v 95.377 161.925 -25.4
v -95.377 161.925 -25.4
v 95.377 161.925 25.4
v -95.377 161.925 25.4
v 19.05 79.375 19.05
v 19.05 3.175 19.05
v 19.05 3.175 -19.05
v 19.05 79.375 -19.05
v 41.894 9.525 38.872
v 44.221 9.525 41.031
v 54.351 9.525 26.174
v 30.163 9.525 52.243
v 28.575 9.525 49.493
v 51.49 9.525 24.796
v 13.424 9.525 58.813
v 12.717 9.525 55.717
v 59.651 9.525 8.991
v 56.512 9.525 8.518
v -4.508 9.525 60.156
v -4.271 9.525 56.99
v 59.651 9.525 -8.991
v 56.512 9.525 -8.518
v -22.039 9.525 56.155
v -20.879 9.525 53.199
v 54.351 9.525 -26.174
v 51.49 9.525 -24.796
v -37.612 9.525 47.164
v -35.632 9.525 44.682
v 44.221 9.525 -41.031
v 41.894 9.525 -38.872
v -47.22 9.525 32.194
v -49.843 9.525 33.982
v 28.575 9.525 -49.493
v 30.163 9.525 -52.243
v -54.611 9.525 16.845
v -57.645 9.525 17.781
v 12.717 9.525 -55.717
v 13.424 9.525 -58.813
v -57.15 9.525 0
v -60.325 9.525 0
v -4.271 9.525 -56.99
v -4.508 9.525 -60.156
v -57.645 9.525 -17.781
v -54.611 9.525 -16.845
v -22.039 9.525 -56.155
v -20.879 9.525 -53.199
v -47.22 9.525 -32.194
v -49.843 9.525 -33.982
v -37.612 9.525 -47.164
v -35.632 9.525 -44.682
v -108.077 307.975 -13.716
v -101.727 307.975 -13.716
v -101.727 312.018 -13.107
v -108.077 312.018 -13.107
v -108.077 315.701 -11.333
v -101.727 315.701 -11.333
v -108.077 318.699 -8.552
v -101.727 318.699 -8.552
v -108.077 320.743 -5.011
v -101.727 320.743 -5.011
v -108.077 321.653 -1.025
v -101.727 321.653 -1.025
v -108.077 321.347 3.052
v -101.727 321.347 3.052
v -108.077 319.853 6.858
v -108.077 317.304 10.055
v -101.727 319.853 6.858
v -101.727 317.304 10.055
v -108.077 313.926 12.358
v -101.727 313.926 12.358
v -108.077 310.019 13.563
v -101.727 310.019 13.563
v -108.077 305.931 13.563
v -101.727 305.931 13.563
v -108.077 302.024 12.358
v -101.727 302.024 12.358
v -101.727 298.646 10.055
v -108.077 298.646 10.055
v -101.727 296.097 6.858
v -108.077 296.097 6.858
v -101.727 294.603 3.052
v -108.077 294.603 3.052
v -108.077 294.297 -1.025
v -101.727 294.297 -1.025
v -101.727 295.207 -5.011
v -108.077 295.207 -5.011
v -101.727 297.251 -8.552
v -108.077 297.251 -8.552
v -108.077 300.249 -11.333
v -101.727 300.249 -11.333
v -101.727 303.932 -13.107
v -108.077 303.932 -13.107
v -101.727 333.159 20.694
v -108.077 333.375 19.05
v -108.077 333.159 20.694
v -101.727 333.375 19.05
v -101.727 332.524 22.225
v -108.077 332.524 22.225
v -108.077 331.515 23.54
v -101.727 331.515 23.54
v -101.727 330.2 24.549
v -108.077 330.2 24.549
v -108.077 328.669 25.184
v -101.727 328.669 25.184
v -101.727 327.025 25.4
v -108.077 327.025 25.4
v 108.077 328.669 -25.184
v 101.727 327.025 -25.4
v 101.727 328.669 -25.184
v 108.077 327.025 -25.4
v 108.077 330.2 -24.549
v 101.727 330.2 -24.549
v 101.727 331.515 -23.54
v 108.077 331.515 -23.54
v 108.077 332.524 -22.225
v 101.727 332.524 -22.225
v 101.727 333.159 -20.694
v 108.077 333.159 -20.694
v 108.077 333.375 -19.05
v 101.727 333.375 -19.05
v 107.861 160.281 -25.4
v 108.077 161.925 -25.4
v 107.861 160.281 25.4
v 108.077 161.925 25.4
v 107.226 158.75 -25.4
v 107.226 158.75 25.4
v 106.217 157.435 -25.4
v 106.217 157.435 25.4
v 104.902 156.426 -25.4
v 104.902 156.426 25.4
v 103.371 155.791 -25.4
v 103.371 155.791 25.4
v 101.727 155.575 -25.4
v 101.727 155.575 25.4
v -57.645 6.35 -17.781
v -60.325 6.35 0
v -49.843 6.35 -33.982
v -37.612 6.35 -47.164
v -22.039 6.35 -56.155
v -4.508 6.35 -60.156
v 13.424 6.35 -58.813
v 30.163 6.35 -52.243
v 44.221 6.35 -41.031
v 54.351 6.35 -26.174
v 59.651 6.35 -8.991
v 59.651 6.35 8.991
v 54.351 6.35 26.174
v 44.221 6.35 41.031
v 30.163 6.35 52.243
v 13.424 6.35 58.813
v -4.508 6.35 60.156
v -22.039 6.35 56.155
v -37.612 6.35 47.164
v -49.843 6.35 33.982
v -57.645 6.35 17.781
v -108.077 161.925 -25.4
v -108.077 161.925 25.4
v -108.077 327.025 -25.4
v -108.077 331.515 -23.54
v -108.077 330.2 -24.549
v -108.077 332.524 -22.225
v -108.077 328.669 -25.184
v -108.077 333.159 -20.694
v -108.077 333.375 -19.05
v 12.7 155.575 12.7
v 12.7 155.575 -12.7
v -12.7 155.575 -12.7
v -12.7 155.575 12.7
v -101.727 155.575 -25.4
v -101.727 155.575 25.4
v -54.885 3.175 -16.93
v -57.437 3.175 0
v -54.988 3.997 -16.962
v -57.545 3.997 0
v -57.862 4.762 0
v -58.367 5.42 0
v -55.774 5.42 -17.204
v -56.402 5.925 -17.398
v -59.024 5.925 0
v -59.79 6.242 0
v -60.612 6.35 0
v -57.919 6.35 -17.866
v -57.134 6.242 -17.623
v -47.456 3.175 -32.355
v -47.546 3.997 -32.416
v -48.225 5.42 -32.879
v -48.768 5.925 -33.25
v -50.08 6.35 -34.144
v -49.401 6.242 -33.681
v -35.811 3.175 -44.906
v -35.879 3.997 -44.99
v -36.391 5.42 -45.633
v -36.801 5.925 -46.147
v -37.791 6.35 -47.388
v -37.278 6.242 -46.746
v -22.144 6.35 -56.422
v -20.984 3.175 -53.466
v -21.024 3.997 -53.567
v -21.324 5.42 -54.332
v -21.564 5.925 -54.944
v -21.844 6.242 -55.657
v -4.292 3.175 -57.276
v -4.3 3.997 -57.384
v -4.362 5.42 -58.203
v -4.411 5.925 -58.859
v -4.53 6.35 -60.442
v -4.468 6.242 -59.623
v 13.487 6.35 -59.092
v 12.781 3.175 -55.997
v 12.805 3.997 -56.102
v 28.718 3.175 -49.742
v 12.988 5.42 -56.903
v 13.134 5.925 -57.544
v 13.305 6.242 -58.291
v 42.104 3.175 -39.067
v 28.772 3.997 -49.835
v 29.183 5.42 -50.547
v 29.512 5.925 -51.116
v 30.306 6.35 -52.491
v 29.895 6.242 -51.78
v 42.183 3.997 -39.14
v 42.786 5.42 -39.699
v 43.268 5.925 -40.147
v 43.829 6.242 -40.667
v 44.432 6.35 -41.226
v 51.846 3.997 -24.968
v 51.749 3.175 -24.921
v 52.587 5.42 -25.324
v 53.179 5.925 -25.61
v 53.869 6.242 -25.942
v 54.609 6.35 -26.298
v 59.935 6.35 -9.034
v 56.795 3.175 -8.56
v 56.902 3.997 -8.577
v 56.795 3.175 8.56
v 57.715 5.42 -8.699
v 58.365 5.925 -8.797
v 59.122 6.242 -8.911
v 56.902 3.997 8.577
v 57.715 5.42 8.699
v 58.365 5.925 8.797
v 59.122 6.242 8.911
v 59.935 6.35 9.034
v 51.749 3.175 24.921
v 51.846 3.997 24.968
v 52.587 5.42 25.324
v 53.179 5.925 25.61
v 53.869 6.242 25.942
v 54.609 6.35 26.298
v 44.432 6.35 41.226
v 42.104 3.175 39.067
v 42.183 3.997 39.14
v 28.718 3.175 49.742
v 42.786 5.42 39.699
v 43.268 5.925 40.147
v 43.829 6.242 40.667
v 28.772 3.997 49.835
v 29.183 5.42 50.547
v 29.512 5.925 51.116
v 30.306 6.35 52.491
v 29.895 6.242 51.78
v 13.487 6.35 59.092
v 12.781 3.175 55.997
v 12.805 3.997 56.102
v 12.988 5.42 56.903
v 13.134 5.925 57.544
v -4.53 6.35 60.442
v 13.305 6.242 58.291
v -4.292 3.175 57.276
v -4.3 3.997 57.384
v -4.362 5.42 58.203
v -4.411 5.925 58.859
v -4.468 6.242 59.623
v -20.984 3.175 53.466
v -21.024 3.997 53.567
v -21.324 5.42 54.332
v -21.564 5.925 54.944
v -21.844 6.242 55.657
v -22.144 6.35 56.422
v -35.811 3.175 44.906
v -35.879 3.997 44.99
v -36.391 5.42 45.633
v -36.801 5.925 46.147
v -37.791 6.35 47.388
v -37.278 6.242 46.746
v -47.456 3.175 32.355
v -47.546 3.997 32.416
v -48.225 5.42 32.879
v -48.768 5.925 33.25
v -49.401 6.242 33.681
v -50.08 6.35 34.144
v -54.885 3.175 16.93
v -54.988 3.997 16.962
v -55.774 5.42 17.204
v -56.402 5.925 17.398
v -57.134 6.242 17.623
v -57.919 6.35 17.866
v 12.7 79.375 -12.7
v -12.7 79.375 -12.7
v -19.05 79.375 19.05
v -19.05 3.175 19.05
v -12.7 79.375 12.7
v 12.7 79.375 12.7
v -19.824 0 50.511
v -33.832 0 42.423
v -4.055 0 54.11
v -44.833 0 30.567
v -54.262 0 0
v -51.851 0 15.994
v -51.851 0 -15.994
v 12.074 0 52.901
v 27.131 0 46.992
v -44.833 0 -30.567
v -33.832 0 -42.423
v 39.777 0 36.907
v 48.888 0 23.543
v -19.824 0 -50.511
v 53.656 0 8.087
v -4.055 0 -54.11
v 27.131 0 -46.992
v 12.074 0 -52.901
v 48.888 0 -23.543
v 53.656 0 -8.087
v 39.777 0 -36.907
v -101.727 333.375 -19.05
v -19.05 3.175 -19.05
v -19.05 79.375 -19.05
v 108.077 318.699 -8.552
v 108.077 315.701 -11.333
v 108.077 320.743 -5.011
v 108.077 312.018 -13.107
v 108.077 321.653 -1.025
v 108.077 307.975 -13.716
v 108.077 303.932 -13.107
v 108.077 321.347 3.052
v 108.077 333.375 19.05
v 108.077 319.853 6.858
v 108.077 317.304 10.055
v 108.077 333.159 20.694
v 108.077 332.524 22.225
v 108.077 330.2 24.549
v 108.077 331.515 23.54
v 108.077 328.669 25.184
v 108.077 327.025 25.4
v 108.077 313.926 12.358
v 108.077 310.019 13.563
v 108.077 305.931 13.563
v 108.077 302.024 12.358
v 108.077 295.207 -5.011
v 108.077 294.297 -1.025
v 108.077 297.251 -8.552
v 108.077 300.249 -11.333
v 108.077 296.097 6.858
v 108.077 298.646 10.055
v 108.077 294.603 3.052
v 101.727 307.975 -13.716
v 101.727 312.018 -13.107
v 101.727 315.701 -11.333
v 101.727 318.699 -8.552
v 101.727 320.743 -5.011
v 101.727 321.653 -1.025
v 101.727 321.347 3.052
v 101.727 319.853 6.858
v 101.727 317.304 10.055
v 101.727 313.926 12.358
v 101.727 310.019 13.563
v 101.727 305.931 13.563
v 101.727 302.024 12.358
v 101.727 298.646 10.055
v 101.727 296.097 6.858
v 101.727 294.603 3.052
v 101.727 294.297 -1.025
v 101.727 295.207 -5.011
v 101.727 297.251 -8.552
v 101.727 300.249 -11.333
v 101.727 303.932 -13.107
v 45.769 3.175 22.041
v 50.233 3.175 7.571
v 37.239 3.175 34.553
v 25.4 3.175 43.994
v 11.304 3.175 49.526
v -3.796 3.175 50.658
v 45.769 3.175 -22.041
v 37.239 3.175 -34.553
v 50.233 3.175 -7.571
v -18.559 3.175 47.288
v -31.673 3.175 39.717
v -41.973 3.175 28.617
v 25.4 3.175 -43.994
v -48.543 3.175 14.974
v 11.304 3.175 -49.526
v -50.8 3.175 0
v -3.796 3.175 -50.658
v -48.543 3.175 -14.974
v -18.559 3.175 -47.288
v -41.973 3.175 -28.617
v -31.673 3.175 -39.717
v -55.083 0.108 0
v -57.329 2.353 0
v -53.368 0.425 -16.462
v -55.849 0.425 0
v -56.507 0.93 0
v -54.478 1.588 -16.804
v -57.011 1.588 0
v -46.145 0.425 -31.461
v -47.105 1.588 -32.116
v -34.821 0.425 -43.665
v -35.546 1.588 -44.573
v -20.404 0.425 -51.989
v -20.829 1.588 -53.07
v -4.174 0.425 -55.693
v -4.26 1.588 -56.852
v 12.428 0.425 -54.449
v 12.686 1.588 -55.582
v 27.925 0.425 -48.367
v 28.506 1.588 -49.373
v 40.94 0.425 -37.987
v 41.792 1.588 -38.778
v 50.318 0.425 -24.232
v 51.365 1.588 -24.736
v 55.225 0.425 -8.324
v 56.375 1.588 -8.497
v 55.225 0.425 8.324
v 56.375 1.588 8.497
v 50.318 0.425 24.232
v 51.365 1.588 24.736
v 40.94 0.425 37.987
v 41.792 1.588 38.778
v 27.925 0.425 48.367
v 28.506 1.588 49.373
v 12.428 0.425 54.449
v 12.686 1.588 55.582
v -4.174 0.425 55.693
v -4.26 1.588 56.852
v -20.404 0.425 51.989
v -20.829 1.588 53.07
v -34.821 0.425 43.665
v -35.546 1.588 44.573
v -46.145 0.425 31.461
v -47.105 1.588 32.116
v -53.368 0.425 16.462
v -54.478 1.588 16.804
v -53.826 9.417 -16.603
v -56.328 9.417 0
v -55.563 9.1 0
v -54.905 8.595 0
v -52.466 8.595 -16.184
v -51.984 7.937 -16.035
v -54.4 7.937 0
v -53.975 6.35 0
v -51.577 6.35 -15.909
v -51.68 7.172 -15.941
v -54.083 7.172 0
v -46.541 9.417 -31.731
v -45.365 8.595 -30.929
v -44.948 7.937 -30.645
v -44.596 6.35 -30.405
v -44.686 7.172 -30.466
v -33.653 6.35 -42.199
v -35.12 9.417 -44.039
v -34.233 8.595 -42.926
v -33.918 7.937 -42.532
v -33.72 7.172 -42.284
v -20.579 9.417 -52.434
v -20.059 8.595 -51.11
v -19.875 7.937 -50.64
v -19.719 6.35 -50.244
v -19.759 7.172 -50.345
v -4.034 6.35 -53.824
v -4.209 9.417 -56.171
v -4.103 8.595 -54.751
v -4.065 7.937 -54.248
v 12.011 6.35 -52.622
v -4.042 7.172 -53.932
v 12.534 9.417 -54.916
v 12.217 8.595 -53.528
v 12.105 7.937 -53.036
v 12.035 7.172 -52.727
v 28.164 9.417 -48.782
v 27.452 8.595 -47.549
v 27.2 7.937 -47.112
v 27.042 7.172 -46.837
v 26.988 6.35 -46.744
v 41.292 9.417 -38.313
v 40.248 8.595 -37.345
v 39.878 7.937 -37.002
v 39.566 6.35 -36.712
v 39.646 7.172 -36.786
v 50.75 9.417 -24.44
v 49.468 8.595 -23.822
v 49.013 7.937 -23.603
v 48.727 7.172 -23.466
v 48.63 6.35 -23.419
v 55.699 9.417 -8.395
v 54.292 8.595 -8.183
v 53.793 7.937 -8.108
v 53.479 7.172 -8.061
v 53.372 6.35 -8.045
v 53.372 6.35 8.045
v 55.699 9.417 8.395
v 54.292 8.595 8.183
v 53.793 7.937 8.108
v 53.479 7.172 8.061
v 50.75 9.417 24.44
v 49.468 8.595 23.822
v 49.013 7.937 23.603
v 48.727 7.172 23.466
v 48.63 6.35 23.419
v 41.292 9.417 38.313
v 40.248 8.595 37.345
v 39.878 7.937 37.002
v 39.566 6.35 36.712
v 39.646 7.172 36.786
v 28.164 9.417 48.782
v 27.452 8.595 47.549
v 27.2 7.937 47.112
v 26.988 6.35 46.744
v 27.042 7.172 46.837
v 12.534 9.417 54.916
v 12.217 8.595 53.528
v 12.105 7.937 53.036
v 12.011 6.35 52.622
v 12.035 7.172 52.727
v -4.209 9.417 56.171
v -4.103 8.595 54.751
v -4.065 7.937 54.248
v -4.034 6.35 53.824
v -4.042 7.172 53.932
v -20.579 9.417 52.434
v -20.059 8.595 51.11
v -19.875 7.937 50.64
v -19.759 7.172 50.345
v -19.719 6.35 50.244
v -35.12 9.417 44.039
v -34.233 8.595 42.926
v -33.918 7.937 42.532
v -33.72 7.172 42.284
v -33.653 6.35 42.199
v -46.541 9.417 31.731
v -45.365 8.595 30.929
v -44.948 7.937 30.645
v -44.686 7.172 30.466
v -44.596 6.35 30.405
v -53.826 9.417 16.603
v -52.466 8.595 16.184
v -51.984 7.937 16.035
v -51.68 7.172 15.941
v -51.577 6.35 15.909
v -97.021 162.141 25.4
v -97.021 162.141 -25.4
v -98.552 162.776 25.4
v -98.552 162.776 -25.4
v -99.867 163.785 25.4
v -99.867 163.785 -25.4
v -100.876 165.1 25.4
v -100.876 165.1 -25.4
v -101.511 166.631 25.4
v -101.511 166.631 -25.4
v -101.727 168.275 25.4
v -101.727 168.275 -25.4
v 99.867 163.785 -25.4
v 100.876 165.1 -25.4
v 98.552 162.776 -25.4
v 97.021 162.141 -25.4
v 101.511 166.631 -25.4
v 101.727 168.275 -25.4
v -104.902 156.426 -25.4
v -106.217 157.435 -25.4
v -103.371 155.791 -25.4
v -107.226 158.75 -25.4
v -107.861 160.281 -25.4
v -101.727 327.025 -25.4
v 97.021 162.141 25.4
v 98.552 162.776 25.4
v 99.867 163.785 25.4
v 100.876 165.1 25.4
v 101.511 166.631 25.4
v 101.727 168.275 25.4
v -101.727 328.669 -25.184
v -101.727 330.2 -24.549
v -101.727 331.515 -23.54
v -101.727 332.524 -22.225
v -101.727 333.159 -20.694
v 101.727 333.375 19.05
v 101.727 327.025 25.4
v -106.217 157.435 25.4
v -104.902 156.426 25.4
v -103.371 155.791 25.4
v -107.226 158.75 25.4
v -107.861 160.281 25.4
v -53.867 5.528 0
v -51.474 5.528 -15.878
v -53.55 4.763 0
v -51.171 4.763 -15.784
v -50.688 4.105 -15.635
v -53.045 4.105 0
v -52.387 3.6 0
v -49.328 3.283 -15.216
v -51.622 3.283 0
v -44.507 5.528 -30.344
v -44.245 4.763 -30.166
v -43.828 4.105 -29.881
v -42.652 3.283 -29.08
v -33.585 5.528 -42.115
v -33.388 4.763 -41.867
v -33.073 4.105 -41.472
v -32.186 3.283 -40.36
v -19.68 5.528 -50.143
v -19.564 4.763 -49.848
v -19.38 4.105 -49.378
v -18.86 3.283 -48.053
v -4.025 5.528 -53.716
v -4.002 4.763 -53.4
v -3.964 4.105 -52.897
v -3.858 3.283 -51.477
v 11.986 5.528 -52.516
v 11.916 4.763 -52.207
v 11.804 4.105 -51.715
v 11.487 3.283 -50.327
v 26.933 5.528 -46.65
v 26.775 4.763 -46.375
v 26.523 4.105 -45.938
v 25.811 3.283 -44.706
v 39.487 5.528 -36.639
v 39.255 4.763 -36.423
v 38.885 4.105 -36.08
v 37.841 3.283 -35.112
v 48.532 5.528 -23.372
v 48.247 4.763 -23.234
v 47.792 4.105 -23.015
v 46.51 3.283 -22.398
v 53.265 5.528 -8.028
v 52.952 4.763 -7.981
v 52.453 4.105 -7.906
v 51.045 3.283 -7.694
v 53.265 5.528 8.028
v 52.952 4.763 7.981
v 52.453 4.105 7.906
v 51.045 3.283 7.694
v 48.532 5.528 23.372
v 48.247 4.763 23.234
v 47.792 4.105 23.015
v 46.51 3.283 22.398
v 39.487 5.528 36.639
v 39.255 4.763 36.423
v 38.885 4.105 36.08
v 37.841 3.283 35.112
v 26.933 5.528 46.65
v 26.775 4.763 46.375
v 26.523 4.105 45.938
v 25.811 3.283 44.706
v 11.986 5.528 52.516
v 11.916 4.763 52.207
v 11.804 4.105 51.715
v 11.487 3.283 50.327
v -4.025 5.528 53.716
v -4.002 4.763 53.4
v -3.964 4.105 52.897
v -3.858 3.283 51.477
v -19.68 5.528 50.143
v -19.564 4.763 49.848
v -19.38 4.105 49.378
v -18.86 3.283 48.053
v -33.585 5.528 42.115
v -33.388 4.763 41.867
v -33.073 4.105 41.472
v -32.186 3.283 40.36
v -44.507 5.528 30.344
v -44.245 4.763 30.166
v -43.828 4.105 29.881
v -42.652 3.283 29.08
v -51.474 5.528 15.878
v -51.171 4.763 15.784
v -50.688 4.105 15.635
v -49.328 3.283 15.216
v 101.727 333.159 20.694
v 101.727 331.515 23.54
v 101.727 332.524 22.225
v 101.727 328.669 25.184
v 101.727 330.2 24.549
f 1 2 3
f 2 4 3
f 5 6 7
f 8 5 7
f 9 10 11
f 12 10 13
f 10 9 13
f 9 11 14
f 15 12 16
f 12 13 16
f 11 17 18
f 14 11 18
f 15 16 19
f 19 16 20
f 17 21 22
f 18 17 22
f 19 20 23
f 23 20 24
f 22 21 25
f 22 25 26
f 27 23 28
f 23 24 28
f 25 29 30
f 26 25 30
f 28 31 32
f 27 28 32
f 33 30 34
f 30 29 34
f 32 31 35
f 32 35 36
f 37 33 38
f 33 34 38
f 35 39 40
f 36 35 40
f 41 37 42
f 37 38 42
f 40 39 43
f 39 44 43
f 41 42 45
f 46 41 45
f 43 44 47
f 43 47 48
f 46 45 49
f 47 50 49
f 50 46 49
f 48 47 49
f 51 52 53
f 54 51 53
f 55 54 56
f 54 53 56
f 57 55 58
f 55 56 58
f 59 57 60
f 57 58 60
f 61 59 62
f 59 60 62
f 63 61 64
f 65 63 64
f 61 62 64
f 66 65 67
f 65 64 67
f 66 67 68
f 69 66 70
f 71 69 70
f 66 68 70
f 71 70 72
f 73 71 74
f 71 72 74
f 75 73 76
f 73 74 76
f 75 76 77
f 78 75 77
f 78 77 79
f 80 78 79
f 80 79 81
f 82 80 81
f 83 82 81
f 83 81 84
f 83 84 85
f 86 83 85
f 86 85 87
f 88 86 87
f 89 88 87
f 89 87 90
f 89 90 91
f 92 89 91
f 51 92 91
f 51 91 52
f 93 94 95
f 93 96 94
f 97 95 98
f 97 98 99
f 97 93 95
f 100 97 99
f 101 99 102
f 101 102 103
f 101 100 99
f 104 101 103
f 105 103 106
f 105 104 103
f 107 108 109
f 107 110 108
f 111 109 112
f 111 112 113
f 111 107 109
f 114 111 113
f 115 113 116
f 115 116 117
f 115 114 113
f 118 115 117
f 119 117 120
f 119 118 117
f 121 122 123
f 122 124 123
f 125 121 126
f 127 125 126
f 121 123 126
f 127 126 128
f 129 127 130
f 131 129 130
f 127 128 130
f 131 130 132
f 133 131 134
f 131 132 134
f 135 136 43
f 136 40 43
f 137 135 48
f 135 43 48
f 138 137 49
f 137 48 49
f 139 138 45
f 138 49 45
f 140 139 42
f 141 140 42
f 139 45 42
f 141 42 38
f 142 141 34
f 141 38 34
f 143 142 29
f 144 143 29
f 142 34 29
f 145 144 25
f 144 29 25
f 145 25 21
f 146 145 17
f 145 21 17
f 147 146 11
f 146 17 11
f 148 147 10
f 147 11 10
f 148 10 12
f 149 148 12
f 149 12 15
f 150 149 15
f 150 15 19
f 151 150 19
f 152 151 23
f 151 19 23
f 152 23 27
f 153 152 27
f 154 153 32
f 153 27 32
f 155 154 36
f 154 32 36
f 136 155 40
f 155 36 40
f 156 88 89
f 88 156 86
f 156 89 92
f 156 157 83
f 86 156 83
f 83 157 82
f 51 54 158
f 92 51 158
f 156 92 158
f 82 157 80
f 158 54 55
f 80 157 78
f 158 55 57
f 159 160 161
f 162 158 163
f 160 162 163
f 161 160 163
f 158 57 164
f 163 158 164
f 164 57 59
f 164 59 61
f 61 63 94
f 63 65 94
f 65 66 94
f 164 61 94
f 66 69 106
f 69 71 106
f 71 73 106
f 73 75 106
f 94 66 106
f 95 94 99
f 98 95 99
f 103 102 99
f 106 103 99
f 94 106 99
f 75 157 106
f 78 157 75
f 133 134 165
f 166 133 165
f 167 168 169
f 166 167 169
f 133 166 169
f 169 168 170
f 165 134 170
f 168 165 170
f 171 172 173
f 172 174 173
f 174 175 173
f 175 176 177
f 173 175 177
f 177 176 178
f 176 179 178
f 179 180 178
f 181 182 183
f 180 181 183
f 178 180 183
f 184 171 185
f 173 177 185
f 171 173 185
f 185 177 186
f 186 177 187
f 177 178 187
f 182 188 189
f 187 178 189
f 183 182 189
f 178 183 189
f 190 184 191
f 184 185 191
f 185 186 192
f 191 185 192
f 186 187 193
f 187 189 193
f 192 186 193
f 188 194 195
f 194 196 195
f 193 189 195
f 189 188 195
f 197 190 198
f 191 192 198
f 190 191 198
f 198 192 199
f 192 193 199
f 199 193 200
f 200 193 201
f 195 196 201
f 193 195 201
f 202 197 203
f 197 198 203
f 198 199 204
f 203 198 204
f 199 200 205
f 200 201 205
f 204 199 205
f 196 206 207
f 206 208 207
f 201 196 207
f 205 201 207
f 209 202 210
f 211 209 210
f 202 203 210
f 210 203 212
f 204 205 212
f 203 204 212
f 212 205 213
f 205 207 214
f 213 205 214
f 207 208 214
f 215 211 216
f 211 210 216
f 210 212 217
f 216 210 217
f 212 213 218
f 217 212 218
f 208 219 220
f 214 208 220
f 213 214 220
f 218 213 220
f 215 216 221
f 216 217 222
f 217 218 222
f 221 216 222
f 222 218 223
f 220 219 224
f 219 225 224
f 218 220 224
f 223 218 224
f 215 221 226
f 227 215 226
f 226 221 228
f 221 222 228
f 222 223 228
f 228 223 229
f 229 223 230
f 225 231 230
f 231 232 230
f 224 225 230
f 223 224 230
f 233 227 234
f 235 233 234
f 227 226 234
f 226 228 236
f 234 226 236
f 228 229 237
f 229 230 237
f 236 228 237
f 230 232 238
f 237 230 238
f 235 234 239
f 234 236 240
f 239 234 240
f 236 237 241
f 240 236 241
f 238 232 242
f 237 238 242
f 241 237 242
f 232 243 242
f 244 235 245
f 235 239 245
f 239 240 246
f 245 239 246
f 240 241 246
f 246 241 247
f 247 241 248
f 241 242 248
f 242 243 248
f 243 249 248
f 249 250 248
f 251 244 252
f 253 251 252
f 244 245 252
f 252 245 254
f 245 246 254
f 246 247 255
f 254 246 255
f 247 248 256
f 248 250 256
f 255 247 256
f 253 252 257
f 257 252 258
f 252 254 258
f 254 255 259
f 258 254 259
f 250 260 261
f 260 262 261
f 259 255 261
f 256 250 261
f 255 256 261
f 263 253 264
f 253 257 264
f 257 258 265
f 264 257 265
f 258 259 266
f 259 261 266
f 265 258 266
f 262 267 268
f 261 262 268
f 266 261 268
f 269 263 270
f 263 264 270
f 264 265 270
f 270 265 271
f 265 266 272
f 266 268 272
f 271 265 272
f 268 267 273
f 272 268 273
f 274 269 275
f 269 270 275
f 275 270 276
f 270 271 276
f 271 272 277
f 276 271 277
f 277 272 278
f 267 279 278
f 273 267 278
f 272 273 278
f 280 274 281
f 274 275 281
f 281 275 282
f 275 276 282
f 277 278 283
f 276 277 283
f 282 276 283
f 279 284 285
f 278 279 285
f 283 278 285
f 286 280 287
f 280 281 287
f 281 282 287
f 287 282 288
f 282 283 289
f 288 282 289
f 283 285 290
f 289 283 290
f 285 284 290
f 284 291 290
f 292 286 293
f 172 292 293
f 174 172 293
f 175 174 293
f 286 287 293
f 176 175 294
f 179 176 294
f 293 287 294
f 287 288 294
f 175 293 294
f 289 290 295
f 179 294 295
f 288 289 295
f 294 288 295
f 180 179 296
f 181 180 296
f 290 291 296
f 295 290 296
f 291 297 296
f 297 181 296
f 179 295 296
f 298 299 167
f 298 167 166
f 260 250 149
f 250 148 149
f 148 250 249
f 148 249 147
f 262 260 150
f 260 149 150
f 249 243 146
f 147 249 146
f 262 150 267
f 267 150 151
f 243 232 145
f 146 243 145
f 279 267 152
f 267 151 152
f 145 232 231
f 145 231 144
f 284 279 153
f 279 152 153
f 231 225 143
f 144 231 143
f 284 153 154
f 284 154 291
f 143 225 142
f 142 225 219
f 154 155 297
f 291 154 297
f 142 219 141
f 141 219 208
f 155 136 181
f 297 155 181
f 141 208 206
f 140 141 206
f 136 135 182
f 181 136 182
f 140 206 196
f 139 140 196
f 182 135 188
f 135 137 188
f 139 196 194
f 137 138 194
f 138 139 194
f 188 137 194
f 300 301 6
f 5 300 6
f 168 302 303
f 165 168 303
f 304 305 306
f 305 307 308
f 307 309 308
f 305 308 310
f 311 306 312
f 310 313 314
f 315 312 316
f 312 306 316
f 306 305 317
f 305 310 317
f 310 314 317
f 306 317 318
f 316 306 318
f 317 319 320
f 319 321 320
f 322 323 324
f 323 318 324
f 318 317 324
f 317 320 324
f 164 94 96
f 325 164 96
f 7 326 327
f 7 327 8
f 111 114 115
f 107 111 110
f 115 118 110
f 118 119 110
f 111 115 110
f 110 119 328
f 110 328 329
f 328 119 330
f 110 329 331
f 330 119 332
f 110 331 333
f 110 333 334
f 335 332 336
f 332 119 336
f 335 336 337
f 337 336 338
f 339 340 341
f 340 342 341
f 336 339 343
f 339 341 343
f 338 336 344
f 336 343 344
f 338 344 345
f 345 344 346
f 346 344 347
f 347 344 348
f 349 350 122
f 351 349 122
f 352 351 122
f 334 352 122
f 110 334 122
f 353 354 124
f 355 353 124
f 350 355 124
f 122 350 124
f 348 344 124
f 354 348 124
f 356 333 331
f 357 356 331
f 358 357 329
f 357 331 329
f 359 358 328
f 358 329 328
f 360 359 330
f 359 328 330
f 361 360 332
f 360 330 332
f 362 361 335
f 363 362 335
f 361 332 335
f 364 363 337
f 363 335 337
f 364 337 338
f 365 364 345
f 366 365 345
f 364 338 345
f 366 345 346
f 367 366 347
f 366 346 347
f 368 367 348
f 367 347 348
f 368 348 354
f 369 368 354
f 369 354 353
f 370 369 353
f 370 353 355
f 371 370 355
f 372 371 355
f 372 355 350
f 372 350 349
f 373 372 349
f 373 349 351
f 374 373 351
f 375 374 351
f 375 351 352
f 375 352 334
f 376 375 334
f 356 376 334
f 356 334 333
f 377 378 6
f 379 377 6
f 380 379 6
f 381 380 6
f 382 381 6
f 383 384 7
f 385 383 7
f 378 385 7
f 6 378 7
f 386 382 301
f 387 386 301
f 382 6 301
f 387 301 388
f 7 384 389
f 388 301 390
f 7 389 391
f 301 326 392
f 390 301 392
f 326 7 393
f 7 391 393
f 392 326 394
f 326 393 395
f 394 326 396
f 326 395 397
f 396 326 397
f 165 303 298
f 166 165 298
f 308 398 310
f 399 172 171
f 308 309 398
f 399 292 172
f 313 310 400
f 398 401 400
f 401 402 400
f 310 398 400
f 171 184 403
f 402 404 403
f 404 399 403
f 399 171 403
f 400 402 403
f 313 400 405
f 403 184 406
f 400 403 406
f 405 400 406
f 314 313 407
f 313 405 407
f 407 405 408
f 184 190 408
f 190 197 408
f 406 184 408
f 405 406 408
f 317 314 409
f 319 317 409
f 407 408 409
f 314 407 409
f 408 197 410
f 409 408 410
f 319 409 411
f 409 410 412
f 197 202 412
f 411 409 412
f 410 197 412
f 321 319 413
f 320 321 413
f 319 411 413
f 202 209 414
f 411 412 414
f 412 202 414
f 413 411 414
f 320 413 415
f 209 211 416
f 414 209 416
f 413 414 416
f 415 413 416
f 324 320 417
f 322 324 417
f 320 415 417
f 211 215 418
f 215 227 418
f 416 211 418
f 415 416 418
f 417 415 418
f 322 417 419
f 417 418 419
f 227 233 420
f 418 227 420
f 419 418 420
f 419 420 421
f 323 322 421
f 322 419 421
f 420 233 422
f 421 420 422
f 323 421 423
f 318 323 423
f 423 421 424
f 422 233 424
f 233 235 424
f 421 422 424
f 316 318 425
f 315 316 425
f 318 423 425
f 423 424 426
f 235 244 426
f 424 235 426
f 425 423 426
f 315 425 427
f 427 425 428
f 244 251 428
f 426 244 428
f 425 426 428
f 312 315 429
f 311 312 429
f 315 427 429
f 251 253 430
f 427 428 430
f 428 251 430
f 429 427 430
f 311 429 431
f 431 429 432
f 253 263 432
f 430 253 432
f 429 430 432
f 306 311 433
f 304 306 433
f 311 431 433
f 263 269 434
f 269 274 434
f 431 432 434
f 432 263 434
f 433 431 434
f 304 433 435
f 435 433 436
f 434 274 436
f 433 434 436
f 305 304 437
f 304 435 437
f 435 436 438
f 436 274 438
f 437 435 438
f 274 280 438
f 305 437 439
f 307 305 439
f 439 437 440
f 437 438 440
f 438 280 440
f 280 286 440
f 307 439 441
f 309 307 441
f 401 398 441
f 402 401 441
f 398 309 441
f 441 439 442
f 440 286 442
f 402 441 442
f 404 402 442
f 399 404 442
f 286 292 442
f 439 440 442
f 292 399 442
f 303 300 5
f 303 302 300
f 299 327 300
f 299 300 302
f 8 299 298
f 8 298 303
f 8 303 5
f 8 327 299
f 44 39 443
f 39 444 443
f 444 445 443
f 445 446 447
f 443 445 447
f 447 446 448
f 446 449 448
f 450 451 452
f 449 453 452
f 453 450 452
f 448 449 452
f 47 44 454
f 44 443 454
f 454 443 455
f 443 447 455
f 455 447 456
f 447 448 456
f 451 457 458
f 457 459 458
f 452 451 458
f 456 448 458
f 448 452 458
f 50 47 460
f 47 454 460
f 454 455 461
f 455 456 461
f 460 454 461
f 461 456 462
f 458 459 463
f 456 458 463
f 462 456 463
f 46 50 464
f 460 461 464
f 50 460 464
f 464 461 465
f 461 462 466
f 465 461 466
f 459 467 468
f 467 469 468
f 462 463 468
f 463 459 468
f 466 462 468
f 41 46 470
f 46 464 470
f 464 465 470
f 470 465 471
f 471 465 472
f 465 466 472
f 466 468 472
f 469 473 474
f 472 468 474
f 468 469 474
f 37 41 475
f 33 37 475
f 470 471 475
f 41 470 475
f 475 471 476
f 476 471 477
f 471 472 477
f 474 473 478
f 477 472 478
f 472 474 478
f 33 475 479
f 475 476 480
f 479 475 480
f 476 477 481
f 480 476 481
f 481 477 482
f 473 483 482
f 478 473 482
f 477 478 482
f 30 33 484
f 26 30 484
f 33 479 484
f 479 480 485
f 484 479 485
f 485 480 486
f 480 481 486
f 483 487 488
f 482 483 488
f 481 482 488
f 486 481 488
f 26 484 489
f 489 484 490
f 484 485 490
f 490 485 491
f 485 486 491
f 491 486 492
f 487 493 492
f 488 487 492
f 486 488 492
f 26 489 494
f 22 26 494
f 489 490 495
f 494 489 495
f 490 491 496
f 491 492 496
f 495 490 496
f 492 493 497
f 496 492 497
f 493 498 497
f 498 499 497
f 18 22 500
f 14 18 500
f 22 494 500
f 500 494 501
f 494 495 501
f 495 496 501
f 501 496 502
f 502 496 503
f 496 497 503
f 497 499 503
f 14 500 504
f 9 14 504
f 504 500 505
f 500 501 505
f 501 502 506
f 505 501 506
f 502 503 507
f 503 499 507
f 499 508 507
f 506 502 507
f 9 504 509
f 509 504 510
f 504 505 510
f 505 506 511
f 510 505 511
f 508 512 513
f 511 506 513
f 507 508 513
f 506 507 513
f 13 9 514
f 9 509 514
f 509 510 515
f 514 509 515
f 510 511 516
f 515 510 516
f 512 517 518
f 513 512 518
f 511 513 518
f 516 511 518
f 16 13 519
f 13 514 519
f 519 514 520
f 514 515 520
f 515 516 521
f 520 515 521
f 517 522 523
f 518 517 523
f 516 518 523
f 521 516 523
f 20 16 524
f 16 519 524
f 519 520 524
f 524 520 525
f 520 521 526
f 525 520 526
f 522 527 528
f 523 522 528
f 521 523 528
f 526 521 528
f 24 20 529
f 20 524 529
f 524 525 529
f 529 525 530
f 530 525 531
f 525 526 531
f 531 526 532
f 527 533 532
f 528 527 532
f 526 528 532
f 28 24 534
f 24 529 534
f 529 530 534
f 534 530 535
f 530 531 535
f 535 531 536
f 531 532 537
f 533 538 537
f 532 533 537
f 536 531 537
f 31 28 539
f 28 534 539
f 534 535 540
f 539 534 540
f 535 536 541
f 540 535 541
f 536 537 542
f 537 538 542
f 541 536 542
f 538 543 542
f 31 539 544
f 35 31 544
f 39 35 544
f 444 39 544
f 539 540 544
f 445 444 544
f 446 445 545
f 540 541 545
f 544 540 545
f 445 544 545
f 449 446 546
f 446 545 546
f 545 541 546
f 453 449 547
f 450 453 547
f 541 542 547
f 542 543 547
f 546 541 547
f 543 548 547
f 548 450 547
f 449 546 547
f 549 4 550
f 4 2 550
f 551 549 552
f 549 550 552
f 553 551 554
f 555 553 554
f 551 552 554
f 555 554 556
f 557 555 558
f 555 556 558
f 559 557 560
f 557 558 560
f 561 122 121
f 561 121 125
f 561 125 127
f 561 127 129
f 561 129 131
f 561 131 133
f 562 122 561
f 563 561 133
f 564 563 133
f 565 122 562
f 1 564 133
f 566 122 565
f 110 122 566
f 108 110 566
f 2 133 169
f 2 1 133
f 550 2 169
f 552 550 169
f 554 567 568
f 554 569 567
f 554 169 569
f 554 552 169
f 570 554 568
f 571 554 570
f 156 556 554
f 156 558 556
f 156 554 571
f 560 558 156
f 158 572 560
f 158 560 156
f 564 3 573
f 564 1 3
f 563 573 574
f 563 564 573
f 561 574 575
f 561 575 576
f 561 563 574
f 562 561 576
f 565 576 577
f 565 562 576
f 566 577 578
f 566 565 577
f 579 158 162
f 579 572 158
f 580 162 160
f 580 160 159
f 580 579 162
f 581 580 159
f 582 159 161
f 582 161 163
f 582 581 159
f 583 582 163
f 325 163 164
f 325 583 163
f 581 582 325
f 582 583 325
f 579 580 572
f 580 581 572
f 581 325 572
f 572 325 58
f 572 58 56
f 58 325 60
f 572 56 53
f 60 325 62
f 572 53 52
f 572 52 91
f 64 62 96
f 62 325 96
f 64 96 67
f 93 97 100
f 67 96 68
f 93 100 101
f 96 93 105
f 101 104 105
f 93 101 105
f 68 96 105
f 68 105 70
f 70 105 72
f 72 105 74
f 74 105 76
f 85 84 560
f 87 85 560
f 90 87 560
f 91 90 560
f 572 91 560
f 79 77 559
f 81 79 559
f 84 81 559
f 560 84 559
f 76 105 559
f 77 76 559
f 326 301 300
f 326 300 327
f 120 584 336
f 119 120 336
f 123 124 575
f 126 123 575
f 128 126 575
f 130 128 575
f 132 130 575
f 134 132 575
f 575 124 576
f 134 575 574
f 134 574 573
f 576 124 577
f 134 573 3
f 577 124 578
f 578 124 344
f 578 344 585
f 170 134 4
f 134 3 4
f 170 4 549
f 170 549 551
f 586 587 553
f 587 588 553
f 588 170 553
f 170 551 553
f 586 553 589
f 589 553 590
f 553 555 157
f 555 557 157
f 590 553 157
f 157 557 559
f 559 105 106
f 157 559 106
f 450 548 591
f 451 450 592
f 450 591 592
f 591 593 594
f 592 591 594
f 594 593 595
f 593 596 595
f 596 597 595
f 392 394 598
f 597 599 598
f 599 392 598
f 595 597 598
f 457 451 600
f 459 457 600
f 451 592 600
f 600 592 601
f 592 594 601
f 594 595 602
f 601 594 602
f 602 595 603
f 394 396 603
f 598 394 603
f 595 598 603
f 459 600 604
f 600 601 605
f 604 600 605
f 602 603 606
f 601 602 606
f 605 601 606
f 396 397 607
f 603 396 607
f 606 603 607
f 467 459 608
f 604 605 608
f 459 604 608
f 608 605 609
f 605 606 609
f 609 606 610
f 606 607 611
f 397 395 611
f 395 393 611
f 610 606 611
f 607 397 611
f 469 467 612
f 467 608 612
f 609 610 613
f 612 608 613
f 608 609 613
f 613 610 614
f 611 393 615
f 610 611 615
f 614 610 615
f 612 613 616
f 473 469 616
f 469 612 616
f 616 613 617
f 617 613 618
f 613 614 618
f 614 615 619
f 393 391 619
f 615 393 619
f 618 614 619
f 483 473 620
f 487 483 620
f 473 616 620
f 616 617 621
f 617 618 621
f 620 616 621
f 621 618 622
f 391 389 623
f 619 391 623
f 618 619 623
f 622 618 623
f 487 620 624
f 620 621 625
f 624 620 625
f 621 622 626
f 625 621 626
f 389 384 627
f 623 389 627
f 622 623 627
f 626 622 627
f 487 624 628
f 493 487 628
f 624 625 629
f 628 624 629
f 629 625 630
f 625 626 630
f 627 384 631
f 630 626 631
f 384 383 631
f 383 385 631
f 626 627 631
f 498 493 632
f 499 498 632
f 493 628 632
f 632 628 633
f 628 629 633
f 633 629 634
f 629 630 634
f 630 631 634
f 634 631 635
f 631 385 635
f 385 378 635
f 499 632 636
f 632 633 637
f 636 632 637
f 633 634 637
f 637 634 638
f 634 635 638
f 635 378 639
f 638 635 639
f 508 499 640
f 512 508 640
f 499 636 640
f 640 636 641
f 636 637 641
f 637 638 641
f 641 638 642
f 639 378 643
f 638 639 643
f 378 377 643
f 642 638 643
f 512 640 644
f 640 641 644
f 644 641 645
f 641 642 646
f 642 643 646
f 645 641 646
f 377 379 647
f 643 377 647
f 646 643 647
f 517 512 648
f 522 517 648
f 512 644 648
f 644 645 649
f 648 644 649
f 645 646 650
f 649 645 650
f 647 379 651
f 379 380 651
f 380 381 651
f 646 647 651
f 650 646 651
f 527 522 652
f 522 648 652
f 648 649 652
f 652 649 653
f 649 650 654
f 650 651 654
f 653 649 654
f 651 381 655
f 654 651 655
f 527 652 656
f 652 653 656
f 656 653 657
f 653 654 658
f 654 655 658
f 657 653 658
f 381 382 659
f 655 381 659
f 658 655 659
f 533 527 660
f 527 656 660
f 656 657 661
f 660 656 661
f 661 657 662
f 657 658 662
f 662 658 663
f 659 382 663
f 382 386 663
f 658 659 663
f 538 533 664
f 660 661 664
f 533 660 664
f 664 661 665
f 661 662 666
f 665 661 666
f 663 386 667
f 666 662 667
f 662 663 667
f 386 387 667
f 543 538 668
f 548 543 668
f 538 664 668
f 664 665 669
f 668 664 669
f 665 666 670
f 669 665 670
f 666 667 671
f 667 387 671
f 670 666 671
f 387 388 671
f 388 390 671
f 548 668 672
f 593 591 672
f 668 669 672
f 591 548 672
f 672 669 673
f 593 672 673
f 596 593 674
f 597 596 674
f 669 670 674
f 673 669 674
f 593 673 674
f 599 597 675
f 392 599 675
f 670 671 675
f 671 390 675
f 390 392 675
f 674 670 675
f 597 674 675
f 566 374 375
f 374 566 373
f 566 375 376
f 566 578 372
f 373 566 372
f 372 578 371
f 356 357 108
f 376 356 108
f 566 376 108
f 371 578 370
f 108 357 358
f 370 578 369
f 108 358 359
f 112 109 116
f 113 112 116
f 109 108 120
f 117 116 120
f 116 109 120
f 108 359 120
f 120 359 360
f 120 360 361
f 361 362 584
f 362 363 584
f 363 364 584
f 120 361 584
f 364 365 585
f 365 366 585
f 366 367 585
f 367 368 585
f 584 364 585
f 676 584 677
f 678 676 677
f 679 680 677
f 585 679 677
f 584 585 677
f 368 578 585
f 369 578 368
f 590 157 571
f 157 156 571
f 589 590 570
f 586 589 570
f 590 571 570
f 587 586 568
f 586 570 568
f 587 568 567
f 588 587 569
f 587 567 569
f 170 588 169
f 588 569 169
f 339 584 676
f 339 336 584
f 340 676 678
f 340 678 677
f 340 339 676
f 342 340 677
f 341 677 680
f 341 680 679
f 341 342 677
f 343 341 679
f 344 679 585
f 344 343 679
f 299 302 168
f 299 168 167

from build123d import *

# Parameters (mm, degrees)
SKETCH3_W           = 38.1
SKETCH3_H           = 38.1
BOSS_EXTRUDE1_DEPTH = 76.2
SKETCH4_W           = 25.4
SKETCH4_H           = 25.4
BOSS_EXTRUDE2_DEPTH = 76.2
BOSS_EXTRUDE3_DEPTH = 25.4
FILLET1_R           = 6.35
FILLET2_R           = 6.35
FILLET3_R           = 6.35
FILLET4_R           = 6.35
SKETCH6_R           = 13.716
CUT_EXTRUDE1_DEPTH  = 402.914443233


with BuildPart() as part:
    # Sketch2 → Revolve1 (revolve)
    with BuildSketch(Plane.XY, mode=Mode.PRIVATE) as revolve1_sk:
        with BuildLine():
            Line((0, 0), (54.261693079, 0))
            ThreePointArc((54.261693079, 0), (56.506757109, 0.92993597), (57.436693079, 3.175))
            ThreePointArc((57.436693079, 3.175), (58.366629049, 5.42006403), (60.611693079, 6.35))
            Line((60.611693079, 6.35), (60.325, 6.35))
            Line((60.325, 6.35), (60.325, 9.525))
            Line((60.325, 9.525), (57.15, 9.525))
            ThreePointArc((57.15, 9.525), (54.90493597, 8.59506403), (53.975, 6.35))
            ThreePointArc((53.975, 6.35), (53.04506403, 4.10493597), (50.8, 3.175))
            Line((50.8, 3.175), (0, 3.175))
            Line((0, 3.175), (0, 0))
        make_face()
    revolve(revolve1_sk.sketch.rotate(Axis((0, 3.175, 0), (0, -1, 0)), 180), axis=Axis((0, 3.175, 0), (0, -1, 0)))

    # Sketch3 → Boss-Extrude1 (add)
    with BuildSketch(Plane(origin=(0, 3.175, 0), x_dir=(1, 0, 0), z_dir=(0, 1, 0))):
        Rectangle(SKETCH3_W, SKETCH3_H)
    extrude(amount=BOSS_EXTRUDE1_DEPTH)

    # Sketch4 → Boss-Extrude2 (add)
    with BuildSketch(Plane(origin=(0, 79.375, 0), x_dir=(1, 0, 0), z_dir=(0, 1, 0))):
        Rectangle(SKETCH4_W, SKETCH4_H)
    extrude(amount=BOSS_EXTRUDE2_DEPTH)

    # Sketch5 → Boss-Extrude3 (add, symmetric)
    with BuildSketch(Plane.XY):
        Polygon((108.077, 155.575), (-108.077, 155.575), (-108.077, 333.375), (-101.727, 333.375), (-101.727, 161.925), (101.727, 161.925), (101.727, 333.375), (108.077, 333.375), align=None)
    extrude(amount=BOSS_EXTRUDE3_DEPTH, both=True)

    # Fillet1
    fillet1_edges = [part.edges().sort_by_distance(p)[0] for p in [
        (101.727, 161.925, 0),
    ]]
    fillet(fillet1_edges, radius=FILLET1_R)

    # Fillet2
    fillet2_edges = [part.edges().sort_by_distance(p)[0] for p in [
        (-101.727, 161.925, 0),
    ]]
    fillet(fillet2_edges, radius=FILLET2_R)

    # Fillet3
    fillet3_edges = [part.edges().sort_by_distance(p)[0] for p in [
        (-108.077, 155.575, 0),
        (108.077, 155.575, 0),
    ]]
    fillet(fillet3_edges, radius=FILLET3_R)

    # Fillet4
    fillet4_edges = [part.edges().sort_by_distance(p)[0] for p in [
        (-104.902, 333.375, -25.4),
        (104.902, 333.375, -25.4),
        (-104.902, 333.375, 25.4),
        (104.902, 333.375, 25.4),
    ]]
    fillet(fillet4_edges, radius=FILLET4_R)

    # Sketch6 → Cut-Extrude1 (cut, through all)
    with BuildSketch(Plane(origin=(108.077, 0, 0), x_dir=(0, 0, -1), z_dir=(1, 0, 0))):
        with Locations((0, 307.975)):
            Circle(SKETCH6_R)
    extrude(amount=-CUT_EXTRUDE1_DEPTH, mode=Mode.SUBTRACT)


solid = part.part
